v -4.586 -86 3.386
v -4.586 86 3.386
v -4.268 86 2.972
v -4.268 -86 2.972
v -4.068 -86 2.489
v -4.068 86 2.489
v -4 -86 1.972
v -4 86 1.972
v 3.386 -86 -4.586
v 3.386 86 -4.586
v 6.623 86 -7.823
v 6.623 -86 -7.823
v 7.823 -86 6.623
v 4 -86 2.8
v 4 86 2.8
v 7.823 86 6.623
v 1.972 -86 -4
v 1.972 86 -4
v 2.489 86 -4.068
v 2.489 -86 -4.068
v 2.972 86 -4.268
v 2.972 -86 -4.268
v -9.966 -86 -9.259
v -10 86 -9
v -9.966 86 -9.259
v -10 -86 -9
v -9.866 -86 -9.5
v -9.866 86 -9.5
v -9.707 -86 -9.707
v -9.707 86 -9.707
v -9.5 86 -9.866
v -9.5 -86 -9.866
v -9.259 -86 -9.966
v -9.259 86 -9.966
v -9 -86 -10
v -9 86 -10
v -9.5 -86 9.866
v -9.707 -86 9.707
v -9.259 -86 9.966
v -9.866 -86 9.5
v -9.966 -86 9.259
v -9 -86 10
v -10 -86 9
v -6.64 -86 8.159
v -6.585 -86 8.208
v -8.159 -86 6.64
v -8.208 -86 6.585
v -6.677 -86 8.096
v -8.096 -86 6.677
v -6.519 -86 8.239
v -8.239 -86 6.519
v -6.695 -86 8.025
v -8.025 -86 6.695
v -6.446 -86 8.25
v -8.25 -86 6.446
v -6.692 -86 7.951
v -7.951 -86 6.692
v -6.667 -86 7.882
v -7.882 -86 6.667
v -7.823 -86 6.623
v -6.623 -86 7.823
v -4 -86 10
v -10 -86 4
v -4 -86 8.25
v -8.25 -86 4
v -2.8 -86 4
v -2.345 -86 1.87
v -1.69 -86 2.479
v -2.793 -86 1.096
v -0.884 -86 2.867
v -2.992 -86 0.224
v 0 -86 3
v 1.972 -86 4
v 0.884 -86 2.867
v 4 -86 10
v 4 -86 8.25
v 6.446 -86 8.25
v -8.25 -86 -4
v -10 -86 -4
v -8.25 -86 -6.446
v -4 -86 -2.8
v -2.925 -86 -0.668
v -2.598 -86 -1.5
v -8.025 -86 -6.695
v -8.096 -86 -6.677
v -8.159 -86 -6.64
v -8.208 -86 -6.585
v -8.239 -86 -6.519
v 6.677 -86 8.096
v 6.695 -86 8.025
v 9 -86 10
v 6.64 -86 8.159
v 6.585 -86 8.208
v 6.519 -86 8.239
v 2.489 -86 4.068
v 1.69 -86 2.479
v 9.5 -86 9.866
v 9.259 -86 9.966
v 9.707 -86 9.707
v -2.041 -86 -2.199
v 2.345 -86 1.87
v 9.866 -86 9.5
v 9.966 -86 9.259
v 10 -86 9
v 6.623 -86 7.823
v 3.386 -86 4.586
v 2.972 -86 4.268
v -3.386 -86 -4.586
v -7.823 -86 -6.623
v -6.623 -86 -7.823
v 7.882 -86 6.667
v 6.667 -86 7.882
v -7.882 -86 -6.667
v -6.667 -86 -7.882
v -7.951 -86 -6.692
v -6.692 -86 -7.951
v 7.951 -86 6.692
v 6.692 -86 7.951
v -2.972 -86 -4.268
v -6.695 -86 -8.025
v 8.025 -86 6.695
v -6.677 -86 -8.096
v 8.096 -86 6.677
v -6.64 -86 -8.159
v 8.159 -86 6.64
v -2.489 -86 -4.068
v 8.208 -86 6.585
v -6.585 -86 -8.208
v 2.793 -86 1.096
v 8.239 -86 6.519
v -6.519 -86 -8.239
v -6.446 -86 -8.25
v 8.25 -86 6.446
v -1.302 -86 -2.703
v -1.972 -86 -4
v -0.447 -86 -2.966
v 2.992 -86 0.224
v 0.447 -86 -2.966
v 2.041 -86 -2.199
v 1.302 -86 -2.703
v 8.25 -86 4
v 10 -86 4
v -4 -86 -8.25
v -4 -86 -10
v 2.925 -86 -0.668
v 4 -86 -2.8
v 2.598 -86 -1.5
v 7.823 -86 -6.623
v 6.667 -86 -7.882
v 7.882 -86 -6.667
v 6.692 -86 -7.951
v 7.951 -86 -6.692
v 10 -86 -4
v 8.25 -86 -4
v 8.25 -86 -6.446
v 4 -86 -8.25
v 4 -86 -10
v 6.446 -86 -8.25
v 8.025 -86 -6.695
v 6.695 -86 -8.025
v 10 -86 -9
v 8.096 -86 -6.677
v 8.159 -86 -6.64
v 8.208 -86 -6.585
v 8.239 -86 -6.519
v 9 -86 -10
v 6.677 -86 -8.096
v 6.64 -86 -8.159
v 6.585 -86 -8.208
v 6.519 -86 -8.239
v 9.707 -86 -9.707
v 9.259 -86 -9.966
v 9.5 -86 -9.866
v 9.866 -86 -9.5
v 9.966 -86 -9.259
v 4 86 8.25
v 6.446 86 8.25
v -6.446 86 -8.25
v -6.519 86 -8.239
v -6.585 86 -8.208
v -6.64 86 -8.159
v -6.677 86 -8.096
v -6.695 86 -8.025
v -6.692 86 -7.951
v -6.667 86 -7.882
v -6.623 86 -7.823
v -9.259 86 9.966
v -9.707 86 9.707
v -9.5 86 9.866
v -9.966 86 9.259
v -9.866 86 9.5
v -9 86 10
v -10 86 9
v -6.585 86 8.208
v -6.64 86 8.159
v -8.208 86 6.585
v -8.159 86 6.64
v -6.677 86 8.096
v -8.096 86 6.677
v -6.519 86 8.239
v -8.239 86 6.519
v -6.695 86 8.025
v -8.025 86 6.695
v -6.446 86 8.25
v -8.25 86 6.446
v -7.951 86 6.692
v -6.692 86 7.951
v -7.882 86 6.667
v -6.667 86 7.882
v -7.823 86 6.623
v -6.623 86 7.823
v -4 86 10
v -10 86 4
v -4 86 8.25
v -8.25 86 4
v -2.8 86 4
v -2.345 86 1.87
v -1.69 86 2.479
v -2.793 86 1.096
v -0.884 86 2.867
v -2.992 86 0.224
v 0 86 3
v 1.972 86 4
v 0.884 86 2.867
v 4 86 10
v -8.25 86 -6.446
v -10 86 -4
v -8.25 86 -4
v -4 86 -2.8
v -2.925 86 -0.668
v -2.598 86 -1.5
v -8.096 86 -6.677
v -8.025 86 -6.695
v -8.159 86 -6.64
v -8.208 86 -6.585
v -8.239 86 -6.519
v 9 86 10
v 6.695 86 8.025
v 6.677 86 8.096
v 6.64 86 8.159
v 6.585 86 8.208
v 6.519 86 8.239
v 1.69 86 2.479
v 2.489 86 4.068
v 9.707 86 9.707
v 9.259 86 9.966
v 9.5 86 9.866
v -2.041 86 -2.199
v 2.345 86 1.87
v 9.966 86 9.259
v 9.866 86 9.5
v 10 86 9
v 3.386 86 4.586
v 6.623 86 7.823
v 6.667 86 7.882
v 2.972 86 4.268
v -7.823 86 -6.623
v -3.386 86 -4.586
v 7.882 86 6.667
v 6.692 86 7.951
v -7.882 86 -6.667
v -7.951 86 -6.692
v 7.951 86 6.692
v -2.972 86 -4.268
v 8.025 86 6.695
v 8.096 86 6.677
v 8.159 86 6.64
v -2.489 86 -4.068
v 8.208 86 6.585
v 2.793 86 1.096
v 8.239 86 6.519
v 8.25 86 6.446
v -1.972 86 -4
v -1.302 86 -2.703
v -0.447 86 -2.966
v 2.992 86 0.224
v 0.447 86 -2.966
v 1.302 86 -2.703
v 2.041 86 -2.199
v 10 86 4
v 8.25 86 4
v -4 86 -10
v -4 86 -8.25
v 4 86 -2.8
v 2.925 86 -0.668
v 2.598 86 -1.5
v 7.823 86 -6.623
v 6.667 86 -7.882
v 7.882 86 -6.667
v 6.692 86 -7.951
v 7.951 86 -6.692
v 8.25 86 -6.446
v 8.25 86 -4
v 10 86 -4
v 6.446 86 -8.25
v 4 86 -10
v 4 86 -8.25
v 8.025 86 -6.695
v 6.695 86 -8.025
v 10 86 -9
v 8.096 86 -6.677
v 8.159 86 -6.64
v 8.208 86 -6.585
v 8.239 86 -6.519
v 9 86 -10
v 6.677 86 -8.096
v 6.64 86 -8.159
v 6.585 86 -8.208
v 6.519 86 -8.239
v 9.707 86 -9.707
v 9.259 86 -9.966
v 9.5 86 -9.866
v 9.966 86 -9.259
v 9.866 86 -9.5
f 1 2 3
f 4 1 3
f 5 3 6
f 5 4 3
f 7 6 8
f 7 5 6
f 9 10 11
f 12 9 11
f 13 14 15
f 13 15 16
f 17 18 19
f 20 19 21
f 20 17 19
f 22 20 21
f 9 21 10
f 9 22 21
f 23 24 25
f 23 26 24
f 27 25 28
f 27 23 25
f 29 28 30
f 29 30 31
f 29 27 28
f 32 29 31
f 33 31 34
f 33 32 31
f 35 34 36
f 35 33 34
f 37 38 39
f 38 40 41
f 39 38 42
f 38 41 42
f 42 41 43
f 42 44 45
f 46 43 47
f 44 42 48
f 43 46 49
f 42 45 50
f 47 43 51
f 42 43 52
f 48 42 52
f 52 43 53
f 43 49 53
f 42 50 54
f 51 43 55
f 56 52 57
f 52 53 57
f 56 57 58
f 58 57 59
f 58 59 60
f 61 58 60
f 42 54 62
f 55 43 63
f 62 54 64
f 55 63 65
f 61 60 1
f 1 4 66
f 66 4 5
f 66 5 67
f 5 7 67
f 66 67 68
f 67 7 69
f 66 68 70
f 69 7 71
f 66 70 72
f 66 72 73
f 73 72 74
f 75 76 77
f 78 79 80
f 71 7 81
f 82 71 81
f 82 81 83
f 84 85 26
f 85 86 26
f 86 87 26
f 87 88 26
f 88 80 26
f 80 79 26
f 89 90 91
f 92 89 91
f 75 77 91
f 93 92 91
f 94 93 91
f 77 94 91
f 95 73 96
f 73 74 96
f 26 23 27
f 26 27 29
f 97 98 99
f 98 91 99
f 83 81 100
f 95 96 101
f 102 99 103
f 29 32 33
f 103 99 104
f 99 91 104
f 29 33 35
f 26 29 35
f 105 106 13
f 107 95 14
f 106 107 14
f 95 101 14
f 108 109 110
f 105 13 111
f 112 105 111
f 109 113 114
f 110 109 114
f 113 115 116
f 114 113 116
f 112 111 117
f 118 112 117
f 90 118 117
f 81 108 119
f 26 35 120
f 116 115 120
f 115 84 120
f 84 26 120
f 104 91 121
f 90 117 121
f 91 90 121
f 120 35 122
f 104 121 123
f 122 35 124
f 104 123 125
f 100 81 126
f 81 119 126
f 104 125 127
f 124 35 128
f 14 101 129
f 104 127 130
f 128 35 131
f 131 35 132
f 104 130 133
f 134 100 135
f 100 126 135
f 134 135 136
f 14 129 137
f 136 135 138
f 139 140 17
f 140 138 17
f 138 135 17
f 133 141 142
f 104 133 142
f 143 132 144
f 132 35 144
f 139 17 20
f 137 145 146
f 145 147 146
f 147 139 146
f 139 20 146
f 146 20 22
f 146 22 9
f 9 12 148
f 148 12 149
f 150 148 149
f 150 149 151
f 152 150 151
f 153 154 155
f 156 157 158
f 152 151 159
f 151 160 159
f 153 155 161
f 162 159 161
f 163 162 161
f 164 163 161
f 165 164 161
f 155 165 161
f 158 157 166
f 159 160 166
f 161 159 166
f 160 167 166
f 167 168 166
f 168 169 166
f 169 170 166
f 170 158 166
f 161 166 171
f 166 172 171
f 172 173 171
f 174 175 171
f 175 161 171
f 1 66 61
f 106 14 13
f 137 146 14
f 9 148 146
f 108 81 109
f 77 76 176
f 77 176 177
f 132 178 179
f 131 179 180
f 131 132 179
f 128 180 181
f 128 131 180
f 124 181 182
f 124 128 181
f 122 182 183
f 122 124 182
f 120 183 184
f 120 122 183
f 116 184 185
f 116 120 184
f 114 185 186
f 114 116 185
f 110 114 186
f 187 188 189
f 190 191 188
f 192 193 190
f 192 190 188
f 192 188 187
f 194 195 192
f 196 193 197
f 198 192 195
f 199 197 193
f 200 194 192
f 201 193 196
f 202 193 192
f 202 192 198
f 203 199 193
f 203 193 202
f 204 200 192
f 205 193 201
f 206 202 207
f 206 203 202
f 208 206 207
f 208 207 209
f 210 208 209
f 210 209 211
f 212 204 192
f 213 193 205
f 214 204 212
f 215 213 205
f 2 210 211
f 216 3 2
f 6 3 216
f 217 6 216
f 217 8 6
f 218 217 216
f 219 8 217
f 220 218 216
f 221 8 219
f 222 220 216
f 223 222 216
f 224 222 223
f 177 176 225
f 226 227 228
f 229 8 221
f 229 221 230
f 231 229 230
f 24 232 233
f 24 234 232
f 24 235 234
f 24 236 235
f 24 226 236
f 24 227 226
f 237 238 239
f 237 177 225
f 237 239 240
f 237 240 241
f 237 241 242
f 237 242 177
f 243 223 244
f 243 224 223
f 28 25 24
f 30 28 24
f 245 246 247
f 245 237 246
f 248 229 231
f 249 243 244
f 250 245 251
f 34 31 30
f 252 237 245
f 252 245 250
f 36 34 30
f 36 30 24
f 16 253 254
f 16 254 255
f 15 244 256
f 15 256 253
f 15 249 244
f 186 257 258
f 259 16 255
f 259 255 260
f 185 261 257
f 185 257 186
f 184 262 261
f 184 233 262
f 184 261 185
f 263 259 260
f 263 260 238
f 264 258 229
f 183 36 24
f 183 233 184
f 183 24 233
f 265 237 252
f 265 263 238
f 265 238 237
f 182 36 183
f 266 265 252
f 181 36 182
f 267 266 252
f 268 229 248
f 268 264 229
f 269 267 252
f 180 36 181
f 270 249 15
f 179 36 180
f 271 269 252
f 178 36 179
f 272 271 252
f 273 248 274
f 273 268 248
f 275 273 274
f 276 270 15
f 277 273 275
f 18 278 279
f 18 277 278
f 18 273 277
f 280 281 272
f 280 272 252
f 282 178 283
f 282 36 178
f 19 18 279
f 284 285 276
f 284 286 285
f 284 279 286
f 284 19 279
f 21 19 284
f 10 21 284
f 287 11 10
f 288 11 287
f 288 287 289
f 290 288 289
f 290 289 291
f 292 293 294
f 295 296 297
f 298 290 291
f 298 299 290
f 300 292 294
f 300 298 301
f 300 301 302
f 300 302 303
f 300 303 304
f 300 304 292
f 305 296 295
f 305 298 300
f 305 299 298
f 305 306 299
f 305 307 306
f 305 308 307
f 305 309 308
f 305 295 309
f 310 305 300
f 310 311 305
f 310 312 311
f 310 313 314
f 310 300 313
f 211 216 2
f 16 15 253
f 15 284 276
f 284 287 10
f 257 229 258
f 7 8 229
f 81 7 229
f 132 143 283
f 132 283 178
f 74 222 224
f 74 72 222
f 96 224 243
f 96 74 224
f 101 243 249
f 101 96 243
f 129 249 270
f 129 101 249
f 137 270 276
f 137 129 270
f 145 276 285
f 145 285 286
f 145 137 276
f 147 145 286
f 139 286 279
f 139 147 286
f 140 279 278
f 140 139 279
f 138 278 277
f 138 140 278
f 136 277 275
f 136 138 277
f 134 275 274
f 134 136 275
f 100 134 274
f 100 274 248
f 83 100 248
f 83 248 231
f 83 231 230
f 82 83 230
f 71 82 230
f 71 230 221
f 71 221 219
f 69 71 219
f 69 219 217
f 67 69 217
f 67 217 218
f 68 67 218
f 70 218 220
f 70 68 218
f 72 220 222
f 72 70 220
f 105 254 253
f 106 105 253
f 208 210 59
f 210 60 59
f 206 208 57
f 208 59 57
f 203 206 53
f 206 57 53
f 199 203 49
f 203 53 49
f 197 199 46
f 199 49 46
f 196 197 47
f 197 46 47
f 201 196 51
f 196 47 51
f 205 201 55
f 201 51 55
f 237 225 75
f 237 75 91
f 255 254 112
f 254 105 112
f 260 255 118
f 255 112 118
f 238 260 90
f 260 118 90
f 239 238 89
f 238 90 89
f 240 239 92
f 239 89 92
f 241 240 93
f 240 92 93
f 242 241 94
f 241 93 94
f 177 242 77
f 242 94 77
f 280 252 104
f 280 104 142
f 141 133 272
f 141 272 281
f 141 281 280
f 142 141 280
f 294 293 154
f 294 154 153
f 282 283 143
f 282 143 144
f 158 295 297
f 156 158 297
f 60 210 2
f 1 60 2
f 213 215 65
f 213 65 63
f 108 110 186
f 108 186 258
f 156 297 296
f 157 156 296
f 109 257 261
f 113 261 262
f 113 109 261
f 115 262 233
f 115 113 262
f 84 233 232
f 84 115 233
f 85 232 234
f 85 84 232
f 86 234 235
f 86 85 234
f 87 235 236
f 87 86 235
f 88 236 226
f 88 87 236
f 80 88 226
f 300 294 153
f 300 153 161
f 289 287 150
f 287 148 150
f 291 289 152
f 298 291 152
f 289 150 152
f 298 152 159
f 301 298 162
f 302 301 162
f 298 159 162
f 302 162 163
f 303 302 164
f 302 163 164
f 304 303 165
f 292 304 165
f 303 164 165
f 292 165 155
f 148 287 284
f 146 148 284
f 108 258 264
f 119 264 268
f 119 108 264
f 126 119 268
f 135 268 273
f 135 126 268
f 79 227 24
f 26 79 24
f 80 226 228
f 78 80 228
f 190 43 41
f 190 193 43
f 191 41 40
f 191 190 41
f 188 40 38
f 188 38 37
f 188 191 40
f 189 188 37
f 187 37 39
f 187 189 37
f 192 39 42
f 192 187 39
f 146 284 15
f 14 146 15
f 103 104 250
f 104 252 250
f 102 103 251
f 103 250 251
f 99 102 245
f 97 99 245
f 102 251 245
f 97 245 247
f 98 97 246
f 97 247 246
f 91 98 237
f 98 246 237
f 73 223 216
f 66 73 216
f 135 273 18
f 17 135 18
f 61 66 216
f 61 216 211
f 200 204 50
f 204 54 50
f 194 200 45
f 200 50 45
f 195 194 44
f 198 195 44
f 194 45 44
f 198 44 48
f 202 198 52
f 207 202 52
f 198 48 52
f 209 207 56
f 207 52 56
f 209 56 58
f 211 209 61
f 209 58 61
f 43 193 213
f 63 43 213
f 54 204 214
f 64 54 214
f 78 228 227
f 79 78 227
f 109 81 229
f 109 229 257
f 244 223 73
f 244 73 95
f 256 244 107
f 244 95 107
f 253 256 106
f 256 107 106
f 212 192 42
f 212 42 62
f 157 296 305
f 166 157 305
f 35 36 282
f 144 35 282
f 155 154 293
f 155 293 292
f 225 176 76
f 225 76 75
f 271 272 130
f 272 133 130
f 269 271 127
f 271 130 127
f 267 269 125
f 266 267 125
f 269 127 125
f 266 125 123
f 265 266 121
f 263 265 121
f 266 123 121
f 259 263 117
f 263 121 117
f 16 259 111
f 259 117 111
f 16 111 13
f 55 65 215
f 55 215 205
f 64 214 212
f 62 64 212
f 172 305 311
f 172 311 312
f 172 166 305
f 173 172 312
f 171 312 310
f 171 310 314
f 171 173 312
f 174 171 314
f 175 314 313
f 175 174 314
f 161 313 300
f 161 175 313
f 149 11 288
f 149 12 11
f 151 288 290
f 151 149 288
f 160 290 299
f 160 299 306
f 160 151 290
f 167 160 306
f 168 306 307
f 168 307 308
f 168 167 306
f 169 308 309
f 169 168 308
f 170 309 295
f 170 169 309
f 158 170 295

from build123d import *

# Parameters (mm, degrees)
ESBO_O1_W                = 20
ESBO_O1_H                = 20
ESBO_O1_R                = 3
RESSALTO_EXTRUS_O1_DEPTH = 86
ESBO_O2_W                = 8
ESBO_O2_H                = 1.75
CORTE_EXTRUS_O1_DEPTH    = 173.580416038
PADR_OCIRCULAR2_COUNT    = 4
FILETE2_R                = 1
FILETE3_R                = 2
FILETE4_R                = 0.25


with BuildPart() as part:
    # Esboço1 → Ressalto-extrusão1 (new, symmetric)
    with BuildSketch(Plane(origin=(0, 0, 0), x_dir=(1, 0, 0), z_dir=(0, 1, 0))):
        Rectangle(ESBO_O1_W, ESBO_O1_H)
        with Locations(Location((0, 0, 0), (0, 0, 270))):
            Circle(ESBO_O1_R, mode=Mode.SUBTRACT)
    extrude(amount=RESSALTO_EXTRUS_O1_DEPTH, both=True)

    # Esboço2 → Corte-extrusão1 (cut, through all)
    with BuildSketch(Plane(origin=(0, 86, 0), x_dir=(1, 0, 0), z_dir=(0, 1, 0))):
        Polygon((-7.05, 8.25), (-2.8, 4), (2.8, 4), (7.05, 8.25), (4, 8.25), (-4, 8.25), align=None)
        with Locations((0, 9.125)):
            Rectangle(ESBO_O2_W, ESBO_O2_H)
    corte_extrus_o1 = extrude(amount=-CORTE_EXTRUS_O1_DEPTH, mode=Mode.SUBTRACT)

    # PadrãoCircular2: Corte-extrusão1 ×4 about axis
    padr_ocircular2_axis = Axis((0, 0, 0), (0, 1, 0))
    for i in range(1, PADR_OCIRCULAR2_COUNT):
        add(corte_extrus_o1.rotate(padr_ocircular2_axis, i * 360 / PADR_OCIRCULAR2_COUNT), mode=Mode.SUBTRACT)

    # Filete2
    filete2_edges = [part.edges().sort_by_distance(p)[0] for p in [
        (10, 0, 10),
        (-10, 0, 10),
        (-10, 0, -10),
        (10, 0, -10),
    ]]
    fillet(filete2_edges, radius=FILETE2_R)

    # Filete3
    filete3_edges = [part.edges().sort_by_distance(p)[0] for p in [
        (-4, 0, 2.8),
        (2.8, 0, -4),
        (-2.8, 0, -4),
        (2.8, 0, 4),
    ]]
    fillet(filete3_edges, radius=FILETE3_R)

    # Filete4
    filete4_edges = [part.edges().sort_by_distance(p)[0] for p in [
        (-8.25, 0, -7.05),
        (-8.25, 0, 7.05),
        (7.05, 0, -8.25),
        (-7.05, 0, -8.25),
        (8.25, 0, 7.05),
        (8.25, 0, -7.05),
        (-7.05, 0, 8.25),
        (7.05, 0, 8.25),
    ]]
    fillet(filete4_edges, radius=FILETE4_R)


solid = part.part
